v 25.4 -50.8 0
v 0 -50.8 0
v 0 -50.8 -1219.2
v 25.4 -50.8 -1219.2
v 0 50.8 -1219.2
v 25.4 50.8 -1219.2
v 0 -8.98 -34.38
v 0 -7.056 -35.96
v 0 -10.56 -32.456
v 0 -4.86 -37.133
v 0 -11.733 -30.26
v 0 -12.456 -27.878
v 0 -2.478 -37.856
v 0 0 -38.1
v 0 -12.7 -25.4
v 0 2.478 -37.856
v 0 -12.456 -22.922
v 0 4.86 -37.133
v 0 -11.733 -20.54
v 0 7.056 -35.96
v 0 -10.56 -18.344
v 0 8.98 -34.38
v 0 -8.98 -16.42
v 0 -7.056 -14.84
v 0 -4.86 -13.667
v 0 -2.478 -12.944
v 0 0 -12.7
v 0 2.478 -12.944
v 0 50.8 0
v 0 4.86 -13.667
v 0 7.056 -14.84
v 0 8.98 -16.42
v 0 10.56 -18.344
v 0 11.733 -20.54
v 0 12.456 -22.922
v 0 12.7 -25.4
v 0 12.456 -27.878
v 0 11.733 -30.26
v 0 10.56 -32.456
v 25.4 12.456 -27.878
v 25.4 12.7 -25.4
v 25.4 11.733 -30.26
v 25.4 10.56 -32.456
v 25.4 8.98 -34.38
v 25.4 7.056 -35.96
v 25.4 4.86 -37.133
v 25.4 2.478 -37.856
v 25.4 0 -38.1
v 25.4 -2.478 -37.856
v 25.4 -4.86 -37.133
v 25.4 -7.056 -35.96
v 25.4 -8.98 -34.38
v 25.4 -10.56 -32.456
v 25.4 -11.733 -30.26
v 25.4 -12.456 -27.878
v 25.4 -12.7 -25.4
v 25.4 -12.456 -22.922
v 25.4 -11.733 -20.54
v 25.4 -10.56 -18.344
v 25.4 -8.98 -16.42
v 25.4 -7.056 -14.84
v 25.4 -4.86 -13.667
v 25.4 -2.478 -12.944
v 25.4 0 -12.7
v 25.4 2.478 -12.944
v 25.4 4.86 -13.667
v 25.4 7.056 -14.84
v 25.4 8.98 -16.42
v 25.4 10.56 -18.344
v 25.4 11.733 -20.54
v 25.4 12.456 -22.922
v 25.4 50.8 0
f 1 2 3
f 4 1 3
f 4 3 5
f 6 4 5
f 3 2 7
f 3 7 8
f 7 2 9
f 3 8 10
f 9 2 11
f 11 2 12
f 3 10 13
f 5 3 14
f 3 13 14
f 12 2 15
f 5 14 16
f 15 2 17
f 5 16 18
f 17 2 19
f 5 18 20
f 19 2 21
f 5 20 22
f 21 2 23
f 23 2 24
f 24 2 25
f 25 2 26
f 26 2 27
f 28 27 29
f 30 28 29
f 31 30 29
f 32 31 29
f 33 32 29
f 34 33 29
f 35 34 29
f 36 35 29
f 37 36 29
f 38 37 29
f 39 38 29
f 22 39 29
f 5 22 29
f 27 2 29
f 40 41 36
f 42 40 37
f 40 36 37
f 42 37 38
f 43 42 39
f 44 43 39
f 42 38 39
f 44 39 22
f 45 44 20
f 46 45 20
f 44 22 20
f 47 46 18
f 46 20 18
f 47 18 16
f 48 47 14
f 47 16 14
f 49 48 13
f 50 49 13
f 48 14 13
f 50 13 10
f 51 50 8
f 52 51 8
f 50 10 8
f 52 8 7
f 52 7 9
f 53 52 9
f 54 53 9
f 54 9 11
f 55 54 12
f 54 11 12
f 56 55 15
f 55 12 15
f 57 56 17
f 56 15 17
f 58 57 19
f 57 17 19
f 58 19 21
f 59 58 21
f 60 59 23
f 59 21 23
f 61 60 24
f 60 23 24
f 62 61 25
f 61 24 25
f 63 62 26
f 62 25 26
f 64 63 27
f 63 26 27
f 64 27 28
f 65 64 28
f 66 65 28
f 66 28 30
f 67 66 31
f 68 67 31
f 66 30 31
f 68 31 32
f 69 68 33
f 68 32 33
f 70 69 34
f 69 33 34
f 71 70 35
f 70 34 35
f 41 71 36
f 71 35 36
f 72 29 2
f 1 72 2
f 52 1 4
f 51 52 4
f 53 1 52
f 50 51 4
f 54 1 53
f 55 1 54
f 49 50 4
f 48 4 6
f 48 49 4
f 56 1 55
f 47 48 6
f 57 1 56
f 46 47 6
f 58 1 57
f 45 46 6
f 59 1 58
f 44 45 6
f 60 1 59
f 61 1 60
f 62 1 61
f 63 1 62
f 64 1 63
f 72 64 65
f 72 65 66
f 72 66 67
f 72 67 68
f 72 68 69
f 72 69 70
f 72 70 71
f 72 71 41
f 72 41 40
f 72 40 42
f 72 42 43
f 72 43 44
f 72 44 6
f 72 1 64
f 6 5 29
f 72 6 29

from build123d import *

# Parameters (mm, degrees)
F1_DEPTH = 25.4


with BuildPart() as f1:
    # F0 (on Right) → F1 (new body)
    with BuildSketch(Plane.YZ):
        Polygon((50.8, 0), (0, 0), (-50.8, 0), (-50.8, -1219.2), (50.8, -1219.2), align=None)
        with BuildLine():
            ThreePointArc((12.7, -25.4), (-8.9802561211, -34.3802561211), (0, -12.7))
            ThreePointArc((0, -12.7), (8.9802561211, -16.4197438789), (12.7, -25.4))
        make_face(mode=Mode.SUBTRACT)
    extrude(amount=F1_DEPTH)


solid = f1.part
